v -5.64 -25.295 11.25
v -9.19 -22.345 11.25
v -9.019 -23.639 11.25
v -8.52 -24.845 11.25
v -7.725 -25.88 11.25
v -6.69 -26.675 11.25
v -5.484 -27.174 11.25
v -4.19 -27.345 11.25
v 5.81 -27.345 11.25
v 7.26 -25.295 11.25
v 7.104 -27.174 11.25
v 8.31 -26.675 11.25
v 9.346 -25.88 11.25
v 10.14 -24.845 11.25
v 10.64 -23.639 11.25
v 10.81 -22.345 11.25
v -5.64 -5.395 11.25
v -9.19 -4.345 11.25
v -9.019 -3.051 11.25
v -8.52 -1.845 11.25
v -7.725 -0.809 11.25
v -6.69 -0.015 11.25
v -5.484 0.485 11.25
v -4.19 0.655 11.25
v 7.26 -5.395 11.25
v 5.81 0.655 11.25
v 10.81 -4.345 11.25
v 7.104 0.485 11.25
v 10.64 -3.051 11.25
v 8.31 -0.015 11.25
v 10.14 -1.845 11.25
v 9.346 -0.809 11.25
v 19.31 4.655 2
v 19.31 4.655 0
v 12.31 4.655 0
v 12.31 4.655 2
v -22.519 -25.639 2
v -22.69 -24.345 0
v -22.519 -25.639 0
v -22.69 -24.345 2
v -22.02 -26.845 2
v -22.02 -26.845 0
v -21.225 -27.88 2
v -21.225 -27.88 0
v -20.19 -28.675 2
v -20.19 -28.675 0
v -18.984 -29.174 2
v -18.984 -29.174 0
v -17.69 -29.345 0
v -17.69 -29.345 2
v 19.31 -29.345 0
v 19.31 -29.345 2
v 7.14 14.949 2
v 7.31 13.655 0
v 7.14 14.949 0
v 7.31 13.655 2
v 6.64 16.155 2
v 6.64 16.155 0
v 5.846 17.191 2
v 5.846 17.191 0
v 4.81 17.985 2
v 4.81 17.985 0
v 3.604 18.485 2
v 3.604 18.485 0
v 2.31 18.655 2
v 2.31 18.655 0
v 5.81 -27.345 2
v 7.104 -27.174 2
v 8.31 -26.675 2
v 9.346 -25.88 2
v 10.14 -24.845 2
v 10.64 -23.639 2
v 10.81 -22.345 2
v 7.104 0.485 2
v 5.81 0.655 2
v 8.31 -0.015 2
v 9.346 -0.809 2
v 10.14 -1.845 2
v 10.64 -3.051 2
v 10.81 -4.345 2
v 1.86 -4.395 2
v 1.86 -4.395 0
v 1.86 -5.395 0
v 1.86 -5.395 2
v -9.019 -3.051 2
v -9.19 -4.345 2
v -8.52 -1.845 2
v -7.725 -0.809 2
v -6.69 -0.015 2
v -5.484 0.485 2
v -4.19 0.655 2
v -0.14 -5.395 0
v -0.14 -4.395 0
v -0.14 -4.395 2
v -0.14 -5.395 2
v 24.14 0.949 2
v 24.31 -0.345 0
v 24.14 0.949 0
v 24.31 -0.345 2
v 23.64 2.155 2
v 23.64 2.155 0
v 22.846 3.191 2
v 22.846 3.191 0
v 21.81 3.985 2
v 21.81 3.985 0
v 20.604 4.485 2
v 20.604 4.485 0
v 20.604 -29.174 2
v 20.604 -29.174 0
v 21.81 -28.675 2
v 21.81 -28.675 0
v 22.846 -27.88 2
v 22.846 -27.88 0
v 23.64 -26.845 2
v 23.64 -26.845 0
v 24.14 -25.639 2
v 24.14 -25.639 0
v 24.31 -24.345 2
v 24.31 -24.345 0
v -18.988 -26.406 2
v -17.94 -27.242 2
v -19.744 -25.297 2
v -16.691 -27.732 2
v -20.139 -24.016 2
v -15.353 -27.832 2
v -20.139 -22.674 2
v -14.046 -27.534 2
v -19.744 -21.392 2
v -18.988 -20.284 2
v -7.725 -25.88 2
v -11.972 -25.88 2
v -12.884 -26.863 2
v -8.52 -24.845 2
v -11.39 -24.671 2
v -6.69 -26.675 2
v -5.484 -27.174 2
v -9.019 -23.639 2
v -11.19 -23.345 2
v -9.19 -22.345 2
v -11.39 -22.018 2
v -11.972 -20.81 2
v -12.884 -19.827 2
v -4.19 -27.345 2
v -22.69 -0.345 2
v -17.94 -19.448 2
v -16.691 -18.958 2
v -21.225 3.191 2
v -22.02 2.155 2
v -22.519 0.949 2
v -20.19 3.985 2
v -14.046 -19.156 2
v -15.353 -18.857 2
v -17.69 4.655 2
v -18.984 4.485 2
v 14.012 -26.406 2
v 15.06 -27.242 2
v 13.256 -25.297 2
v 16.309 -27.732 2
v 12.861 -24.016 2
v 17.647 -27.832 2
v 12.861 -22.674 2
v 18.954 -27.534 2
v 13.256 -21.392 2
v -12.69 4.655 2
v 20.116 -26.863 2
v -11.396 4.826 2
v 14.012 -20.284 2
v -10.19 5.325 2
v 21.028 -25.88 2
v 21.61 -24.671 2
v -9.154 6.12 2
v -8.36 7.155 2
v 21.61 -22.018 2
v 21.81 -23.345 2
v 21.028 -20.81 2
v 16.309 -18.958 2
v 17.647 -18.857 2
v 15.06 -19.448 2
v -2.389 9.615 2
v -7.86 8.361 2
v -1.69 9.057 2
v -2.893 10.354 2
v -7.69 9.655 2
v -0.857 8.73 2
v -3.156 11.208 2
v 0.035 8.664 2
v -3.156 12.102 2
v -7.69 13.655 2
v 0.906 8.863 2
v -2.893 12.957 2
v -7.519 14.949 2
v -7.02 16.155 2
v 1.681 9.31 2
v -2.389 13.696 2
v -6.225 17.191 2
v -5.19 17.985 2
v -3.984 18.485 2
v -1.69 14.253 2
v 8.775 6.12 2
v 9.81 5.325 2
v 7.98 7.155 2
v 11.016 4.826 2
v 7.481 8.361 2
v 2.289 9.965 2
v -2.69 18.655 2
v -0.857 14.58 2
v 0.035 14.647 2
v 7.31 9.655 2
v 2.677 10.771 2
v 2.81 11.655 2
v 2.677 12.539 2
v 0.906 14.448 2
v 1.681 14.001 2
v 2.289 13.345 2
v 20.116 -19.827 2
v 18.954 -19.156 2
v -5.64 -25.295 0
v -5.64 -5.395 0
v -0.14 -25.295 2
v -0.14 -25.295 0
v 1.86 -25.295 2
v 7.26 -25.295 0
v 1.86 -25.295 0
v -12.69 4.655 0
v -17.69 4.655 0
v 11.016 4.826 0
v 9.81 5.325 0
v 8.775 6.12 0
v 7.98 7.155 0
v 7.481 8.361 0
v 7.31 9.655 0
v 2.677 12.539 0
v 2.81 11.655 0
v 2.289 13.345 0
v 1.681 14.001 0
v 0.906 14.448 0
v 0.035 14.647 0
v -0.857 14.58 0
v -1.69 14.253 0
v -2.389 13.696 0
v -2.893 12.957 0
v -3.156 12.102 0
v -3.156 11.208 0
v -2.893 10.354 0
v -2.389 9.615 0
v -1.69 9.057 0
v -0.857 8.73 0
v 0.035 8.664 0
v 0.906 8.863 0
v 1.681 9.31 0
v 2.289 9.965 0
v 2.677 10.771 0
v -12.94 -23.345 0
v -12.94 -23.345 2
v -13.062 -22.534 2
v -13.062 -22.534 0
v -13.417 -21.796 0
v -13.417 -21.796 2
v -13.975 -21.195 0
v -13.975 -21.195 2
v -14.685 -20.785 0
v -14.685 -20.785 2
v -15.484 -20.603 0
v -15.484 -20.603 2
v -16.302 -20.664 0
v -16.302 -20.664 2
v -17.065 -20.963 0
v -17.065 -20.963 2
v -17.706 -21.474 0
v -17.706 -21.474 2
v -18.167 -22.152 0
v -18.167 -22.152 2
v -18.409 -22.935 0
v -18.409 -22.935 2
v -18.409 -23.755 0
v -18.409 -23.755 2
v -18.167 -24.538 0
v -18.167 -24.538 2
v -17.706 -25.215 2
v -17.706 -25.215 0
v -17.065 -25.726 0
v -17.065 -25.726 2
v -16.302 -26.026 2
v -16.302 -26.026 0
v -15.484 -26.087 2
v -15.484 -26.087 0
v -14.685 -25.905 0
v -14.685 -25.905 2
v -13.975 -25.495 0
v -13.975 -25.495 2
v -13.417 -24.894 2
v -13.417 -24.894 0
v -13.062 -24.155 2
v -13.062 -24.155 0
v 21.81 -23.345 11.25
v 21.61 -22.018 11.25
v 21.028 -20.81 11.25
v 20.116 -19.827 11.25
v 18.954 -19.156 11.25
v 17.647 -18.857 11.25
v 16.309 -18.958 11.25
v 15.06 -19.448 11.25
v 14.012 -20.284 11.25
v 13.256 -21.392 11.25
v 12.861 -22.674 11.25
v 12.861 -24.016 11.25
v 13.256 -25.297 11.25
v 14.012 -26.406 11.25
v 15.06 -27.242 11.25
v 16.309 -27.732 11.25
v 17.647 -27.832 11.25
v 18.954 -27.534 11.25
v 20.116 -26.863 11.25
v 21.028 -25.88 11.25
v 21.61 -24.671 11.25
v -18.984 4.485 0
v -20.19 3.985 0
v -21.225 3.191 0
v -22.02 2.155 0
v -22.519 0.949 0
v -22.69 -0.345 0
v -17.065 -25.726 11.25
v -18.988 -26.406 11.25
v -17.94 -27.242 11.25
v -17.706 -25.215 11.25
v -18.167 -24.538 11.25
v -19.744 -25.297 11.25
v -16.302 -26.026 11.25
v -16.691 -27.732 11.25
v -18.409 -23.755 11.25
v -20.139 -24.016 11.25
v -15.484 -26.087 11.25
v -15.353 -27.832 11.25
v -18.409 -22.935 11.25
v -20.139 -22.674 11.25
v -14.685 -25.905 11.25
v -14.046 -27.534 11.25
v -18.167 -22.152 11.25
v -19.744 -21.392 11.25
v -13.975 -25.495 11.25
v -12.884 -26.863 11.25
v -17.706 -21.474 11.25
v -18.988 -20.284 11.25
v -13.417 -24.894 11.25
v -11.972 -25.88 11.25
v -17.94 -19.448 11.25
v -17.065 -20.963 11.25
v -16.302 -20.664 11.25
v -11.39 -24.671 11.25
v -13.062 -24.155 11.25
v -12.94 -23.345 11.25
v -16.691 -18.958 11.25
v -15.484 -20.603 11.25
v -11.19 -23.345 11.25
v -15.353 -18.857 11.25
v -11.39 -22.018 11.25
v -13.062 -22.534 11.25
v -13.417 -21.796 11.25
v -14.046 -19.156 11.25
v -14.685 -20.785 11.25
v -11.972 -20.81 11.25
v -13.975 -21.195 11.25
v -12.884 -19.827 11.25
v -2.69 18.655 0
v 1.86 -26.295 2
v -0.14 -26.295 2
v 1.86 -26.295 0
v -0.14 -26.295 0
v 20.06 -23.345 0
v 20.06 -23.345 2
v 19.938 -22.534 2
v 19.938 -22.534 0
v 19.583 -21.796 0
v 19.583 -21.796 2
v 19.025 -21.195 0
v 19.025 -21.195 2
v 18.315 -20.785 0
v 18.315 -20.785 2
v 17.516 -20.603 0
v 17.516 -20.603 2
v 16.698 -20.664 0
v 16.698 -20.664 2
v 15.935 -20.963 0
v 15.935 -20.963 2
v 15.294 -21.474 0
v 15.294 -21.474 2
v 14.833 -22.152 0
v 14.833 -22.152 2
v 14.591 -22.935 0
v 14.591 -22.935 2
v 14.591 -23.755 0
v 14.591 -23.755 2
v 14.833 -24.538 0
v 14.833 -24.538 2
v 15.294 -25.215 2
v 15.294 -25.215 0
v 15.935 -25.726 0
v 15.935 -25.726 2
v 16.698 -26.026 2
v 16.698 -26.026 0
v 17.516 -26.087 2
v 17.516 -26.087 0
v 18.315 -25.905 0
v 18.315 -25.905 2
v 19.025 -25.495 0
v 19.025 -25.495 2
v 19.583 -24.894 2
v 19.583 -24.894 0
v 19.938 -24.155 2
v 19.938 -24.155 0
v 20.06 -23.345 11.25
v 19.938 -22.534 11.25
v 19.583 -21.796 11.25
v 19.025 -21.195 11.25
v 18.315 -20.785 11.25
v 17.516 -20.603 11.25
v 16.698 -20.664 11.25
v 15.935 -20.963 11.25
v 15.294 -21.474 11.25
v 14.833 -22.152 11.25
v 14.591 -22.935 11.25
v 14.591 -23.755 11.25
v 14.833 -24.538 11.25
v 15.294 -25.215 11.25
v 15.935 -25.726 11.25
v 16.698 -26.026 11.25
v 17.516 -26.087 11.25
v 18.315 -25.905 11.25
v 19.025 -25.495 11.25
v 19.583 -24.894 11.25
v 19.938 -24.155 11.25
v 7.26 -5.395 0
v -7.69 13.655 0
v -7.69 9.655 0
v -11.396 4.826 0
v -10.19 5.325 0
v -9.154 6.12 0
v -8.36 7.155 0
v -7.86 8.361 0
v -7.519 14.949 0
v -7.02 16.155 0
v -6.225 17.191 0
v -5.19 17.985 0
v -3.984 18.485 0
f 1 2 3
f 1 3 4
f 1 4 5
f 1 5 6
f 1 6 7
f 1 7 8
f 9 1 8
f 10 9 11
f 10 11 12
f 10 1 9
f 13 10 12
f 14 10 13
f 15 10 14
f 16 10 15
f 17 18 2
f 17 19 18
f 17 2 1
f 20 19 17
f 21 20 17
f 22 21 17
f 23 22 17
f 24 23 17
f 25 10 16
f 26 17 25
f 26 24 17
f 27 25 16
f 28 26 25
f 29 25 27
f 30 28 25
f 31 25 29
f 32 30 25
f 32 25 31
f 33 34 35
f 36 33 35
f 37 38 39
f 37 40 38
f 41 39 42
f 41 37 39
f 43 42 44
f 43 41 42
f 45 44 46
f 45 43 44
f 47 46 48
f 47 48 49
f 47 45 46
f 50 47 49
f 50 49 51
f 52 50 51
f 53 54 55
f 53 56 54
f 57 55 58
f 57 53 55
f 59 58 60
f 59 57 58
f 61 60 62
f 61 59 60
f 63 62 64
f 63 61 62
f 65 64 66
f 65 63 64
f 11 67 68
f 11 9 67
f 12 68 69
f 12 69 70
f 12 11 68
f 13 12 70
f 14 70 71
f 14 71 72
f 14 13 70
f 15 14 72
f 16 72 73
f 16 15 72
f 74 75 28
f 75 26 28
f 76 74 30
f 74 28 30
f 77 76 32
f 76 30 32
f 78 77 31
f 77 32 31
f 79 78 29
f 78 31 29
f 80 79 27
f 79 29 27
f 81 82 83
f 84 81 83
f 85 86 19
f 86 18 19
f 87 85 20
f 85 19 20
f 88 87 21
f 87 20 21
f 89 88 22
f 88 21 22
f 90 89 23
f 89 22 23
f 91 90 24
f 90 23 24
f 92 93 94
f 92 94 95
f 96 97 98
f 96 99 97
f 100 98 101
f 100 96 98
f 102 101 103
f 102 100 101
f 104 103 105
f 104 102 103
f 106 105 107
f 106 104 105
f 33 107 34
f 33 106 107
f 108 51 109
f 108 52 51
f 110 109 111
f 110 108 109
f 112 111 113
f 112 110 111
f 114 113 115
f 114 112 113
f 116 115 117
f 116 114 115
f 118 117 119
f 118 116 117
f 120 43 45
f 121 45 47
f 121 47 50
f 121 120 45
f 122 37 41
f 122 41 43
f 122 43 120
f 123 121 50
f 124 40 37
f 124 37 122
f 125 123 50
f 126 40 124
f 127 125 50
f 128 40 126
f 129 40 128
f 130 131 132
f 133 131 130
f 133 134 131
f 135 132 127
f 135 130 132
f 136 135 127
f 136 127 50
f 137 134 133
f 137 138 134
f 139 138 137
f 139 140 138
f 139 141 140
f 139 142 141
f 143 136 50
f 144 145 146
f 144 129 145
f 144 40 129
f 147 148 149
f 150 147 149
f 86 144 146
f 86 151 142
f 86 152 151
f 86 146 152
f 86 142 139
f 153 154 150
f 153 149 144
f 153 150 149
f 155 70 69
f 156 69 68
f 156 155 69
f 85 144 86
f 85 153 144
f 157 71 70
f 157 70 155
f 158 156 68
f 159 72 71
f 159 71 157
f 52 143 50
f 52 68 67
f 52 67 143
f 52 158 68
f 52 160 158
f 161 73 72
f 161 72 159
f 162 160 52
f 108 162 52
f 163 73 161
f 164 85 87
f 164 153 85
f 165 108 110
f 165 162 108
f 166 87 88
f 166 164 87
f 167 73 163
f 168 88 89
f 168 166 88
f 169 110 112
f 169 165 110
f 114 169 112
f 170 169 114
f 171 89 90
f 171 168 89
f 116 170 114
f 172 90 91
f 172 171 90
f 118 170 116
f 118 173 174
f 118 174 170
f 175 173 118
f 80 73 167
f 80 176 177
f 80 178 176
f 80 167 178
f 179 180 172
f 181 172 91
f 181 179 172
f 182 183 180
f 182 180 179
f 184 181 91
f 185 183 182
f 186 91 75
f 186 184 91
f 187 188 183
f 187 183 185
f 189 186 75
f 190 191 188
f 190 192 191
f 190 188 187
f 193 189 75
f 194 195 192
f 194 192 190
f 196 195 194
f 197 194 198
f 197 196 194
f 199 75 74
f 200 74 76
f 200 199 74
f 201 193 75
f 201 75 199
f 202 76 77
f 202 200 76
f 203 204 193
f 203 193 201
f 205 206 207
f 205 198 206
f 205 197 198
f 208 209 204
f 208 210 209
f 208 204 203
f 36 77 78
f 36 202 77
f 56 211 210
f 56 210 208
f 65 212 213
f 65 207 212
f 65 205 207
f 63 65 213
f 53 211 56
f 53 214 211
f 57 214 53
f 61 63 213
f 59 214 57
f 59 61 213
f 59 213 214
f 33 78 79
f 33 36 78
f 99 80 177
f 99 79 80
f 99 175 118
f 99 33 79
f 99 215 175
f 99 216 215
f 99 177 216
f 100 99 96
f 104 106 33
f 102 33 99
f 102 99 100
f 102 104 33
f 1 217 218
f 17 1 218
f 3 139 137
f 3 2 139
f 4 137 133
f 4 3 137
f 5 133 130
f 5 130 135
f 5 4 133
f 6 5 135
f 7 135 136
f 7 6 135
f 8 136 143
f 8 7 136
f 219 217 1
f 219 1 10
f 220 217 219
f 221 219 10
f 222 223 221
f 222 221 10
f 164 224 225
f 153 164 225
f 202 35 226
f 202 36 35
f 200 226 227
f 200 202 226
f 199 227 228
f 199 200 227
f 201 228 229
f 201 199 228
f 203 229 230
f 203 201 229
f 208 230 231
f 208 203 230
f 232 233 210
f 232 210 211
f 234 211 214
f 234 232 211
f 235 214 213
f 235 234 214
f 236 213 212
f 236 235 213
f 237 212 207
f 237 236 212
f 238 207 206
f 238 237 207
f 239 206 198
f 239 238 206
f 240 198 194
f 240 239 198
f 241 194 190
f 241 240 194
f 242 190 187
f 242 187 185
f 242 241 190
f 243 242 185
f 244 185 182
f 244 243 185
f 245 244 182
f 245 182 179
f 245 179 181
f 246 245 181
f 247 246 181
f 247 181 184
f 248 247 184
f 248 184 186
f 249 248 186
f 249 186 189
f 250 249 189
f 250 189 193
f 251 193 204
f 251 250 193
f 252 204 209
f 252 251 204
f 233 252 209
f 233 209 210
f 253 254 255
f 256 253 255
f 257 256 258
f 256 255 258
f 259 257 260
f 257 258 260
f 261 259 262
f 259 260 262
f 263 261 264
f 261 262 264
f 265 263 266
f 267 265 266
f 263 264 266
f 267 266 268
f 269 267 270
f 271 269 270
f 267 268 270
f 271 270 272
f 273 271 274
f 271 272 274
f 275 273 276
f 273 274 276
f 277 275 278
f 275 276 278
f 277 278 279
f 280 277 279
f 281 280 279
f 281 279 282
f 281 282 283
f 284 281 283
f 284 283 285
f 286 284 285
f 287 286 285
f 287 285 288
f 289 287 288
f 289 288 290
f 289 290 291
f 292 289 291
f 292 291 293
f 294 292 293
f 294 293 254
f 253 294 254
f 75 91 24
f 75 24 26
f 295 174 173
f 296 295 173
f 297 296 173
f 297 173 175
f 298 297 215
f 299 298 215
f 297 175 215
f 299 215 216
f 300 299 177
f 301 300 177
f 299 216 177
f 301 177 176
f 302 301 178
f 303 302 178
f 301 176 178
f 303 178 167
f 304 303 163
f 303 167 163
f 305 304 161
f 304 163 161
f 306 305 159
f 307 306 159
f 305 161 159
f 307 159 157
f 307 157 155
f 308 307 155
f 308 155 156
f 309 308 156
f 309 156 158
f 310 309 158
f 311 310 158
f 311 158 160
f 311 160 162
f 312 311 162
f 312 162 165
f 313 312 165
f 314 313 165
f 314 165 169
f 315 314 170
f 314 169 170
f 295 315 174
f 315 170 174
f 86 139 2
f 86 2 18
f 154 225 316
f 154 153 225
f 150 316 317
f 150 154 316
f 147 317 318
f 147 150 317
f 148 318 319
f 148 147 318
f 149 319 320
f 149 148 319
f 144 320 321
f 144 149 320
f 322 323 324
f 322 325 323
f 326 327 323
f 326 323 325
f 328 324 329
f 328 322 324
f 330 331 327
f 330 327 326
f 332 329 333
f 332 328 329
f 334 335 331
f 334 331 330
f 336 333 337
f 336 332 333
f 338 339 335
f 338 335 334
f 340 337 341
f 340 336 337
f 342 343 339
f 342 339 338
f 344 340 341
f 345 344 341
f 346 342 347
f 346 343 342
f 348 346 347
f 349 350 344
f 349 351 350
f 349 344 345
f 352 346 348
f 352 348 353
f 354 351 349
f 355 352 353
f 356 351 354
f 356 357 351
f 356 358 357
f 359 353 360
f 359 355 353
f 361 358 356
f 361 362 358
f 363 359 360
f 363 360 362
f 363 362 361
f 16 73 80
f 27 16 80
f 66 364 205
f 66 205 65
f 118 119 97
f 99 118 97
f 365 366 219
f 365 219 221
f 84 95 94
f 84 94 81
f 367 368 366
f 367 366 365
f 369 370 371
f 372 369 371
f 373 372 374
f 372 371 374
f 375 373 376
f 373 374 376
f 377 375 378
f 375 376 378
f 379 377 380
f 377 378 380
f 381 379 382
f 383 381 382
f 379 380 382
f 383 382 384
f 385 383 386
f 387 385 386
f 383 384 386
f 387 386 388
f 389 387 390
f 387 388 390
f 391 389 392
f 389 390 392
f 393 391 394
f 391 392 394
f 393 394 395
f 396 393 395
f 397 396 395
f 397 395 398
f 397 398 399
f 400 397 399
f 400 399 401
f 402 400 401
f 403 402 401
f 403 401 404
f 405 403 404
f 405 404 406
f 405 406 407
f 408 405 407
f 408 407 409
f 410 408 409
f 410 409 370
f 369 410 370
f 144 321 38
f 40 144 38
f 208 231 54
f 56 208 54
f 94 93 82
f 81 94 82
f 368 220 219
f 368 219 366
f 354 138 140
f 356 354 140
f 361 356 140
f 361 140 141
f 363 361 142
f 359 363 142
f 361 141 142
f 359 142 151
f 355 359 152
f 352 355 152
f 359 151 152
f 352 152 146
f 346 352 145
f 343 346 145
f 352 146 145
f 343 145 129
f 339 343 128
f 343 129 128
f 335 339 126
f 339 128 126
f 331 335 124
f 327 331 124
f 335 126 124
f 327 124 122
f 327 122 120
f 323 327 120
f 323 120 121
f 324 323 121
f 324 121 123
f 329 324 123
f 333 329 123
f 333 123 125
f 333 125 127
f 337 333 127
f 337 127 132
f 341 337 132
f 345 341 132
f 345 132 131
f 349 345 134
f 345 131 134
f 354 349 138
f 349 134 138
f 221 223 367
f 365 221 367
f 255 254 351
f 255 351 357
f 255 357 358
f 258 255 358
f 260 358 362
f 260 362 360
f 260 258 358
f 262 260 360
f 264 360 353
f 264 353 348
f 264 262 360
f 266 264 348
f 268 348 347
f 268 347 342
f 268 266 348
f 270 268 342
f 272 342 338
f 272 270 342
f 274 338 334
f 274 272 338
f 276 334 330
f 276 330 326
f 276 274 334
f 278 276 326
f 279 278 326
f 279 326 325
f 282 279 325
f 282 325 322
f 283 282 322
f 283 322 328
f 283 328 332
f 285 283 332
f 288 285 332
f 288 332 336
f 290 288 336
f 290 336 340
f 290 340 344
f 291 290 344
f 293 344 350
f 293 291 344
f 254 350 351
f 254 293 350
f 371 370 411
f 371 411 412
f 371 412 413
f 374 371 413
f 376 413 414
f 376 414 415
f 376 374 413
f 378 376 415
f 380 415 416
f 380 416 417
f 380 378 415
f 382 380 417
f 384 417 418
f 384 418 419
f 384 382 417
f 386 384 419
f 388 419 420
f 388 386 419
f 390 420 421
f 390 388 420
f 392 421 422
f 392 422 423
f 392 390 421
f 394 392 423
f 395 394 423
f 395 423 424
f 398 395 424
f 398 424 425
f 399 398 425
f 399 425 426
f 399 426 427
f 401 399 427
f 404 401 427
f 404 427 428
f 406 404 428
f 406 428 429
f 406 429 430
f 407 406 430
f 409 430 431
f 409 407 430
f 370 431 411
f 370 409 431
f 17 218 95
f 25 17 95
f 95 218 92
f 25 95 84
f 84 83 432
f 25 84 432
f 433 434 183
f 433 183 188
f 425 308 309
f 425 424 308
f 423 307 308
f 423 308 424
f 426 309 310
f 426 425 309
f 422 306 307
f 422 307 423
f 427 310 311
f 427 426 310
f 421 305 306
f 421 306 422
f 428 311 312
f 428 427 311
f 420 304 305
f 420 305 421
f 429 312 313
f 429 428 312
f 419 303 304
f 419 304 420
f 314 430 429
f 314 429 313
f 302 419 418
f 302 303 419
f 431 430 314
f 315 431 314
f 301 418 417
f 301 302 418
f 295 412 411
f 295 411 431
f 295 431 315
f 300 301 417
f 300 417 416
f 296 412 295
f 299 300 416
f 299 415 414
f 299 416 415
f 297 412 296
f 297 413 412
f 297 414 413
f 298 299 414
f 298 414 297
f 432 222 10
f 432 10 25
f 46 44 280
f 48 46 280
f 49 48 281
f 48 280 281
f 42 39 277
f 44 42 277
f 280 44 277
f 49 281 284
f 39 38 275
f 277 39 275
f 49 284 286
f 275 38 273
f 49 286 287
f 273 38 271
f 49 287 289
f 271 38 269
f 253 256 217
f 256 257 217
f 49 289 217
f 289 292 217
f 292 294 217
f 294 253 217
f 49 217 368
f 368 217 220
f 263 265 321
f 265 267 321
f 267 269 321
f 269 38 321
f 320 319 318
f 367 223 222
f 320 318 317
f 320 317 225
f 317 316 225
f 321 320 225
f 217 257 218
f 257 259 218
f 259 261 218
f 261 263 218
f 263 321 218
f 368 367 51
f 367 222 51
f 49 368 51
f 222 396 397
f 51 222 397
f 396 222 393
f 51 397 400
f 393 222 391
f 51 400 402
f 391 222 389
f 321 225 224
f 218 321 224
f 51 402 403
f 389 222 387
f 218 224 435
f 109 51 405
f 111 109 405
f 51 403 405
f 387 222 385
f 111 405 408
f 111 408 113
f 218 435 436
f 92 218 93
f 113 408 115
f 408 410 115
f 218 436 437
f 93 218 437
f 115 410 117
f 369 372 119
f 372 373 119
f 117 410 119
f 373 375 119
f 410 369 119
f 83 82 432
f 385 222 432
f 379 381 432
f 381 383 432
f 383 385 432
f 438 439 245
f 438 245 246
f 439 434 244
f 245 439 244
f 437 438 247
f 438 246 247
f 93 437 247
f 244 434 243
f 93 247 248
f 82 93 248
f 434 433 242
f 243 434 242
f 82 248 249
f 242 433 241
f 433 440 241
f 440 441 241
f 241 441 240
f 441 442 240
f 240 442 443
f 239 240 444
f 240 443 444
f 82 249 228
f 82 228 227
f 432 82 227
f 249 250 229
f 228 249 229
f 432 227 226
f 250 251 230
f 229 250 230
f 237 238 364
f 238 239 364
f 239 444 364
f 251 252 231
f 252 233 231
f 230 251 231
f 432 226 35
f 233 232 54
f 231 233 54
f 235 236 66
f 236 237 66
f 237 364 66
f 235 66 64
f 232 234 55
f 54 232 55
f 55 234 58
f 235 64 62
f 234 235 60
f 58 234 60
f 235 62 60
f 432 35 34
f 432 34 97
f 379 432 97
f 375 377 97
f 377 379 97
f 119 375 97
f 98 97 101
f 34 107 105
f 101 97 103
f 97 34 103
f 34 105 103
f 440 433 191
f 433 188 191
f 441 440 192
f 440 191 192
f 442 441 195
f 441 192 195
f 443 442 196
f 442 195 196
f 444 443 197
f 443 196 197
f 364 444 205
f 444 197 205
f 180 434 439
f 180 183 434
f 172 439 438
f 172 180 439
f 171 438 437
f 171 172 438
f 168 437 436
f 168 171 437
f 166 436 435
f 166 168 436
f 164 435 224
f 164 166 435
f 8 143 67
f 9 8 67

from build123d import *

# Parameters (mm, degrees)
F0_W     = 15
F0_H     = 14
F0_R     = 3
F0_W_2   = 20
F0_H_2   = 2
F1_DEPTH = 2
F0_H_3   = 28
F0_W_3   = 12.9
F0_H_4   = 19.9
F2_DEPTH = 11.25
F3_R     = 5
F4_W     = 2
F4_H     = 1
F5_DEPTH = 2
F6_R     = 4.5
F6_R_2   = 2.75
F7_DEPTH = 9.25
F8_DEPTH = 2.001


with BuildPart() as f1:
    # F0 (on Top) → F1 (new body)
    with BuildSketch(Plane.XY):
        with Locations((-0.1896551724, 11.6551724138)):
            Rectangle(F0_W, F0_H)
        with Locations((-0.1896551724, 11.6551724138)):
            Circle(F0_R, mode=Mode.SUBTRACT)
        Polygon((-7.6896551724, 4.6551724138), (-22.6896551724, 4.6551724138), (-22.6896551724, 0.6551724138), (-9.1896551724, 0.6551724138), (10.8103448276, 0.6551724138), (24.3103448276, 0.6551724138), (24.3103448276, 4.6551724138), (7.3103448276, 4.6551724138), align=None)
        Polygon((-9.1896551724, 0.6551724138), (-22.6896551724, 0.6551724138), (-22.6896551724, -29.3448275862), (-9.1896551724, -29.3448275862), (-9.1896551724, -27.3448275862), align=None)
        Polygon((24.3103448276, 0.6551724138), (10.8103448276, 0.6551724138), (10.8103448276, -27.3448275862), (10.8103448276, -29.3448275862), (24.3103448276, -29.3448275862), align=None)
        with Locations((0.8103448276, -28.3448275862)):
            Rectangle(F0_W_2, F0_H_2)
    extrude(amount=F1_DEPTH)

    # F0 (on Top) → F2 (join)
    with BuildSketch(Plane.XY):
        with Locations((0.8103448276, -13.3448275862)):
            Rectangle(F0_W_2, F0_H_3)
        with Locations((0.8103448276, -15.3448275862)):
            Rectangle(F0_W_3, F0_H_4, mode=Mode.SUBTRACT)
    extrude(amount=F2_DEPTH)

    # F3
    f3_edges = [f1.edges().sort_by_distance(p)[0] for p in [
        (10.810345, 0.655172, 6.625),
        (-9.189655, 0.655172, 6.625),
        (-9.189655, -27.344828, 6.625),
        (10.810345, -27.344828, 6.625),
        (24.310345, -29.344828, 1),
        (-22.689655, -29.344828, 1),
        (24.310345, 4.655172, 1),
        (7.310345, 18.655172, 1),
        (-7.689655, 18.655172, 1),
        (-22.689655, 4.655172, 1),
        (-7.689655, 4.655172, 1),
        (7.310345, 4.655172, 1),
    ]]
    fillet(f3_edges, radius=F3_R)

    # F4 (on face) → F5 (cut)
    with BuildSketch(Plane(origin=(0, 0, 0), x_dir=(1, 0, 0), z_dir=(0, 0, -1))):
        with Locations((0.8603448276, 25.7948275862)):
            Rectangle(F4_W, F4_H)
        with Locations((0.8603448276, 4.8948275862)):
            Rectangle(F4_W, F4_H)
    extrude(amount=-F5_DEPTH, mode=Mode.SUBTRACT)

    # F6 (on face) → F7 (join)
    with BuildSketch(Plane.XY.offset(2)):
        with Locations((-15.6896551724, -23.3448275862)):
            Circle(F6_R)
        with Locations((-15.6896551724, -23.3448275862)):
            Circle(F6_R_2, mode=Mode.SUBTRACT)
        with Locations((17.3103448276, -23.3448275862)):
            Circle(F6_R)
        with Locations((17.3103448276, -23.3448275862)):
            Circle(F6_R_2, mode=Mode.SUBTRACT)
    extrude(amount=F7_DEPTH)

    # F8 (cut, through all): faces of the model
    f8_faces = [f1.faces().sort_by_distance(p)[0] for p in [
        (-15.6896551724, -23.3448275862, 2),
        (17.3103448276, -23.3448275862, 2),
    ]]
    extrude(f8_faces, amount=-F8_DEPTH, mode=Mode.SUBTRACT)


solid = f1.part
